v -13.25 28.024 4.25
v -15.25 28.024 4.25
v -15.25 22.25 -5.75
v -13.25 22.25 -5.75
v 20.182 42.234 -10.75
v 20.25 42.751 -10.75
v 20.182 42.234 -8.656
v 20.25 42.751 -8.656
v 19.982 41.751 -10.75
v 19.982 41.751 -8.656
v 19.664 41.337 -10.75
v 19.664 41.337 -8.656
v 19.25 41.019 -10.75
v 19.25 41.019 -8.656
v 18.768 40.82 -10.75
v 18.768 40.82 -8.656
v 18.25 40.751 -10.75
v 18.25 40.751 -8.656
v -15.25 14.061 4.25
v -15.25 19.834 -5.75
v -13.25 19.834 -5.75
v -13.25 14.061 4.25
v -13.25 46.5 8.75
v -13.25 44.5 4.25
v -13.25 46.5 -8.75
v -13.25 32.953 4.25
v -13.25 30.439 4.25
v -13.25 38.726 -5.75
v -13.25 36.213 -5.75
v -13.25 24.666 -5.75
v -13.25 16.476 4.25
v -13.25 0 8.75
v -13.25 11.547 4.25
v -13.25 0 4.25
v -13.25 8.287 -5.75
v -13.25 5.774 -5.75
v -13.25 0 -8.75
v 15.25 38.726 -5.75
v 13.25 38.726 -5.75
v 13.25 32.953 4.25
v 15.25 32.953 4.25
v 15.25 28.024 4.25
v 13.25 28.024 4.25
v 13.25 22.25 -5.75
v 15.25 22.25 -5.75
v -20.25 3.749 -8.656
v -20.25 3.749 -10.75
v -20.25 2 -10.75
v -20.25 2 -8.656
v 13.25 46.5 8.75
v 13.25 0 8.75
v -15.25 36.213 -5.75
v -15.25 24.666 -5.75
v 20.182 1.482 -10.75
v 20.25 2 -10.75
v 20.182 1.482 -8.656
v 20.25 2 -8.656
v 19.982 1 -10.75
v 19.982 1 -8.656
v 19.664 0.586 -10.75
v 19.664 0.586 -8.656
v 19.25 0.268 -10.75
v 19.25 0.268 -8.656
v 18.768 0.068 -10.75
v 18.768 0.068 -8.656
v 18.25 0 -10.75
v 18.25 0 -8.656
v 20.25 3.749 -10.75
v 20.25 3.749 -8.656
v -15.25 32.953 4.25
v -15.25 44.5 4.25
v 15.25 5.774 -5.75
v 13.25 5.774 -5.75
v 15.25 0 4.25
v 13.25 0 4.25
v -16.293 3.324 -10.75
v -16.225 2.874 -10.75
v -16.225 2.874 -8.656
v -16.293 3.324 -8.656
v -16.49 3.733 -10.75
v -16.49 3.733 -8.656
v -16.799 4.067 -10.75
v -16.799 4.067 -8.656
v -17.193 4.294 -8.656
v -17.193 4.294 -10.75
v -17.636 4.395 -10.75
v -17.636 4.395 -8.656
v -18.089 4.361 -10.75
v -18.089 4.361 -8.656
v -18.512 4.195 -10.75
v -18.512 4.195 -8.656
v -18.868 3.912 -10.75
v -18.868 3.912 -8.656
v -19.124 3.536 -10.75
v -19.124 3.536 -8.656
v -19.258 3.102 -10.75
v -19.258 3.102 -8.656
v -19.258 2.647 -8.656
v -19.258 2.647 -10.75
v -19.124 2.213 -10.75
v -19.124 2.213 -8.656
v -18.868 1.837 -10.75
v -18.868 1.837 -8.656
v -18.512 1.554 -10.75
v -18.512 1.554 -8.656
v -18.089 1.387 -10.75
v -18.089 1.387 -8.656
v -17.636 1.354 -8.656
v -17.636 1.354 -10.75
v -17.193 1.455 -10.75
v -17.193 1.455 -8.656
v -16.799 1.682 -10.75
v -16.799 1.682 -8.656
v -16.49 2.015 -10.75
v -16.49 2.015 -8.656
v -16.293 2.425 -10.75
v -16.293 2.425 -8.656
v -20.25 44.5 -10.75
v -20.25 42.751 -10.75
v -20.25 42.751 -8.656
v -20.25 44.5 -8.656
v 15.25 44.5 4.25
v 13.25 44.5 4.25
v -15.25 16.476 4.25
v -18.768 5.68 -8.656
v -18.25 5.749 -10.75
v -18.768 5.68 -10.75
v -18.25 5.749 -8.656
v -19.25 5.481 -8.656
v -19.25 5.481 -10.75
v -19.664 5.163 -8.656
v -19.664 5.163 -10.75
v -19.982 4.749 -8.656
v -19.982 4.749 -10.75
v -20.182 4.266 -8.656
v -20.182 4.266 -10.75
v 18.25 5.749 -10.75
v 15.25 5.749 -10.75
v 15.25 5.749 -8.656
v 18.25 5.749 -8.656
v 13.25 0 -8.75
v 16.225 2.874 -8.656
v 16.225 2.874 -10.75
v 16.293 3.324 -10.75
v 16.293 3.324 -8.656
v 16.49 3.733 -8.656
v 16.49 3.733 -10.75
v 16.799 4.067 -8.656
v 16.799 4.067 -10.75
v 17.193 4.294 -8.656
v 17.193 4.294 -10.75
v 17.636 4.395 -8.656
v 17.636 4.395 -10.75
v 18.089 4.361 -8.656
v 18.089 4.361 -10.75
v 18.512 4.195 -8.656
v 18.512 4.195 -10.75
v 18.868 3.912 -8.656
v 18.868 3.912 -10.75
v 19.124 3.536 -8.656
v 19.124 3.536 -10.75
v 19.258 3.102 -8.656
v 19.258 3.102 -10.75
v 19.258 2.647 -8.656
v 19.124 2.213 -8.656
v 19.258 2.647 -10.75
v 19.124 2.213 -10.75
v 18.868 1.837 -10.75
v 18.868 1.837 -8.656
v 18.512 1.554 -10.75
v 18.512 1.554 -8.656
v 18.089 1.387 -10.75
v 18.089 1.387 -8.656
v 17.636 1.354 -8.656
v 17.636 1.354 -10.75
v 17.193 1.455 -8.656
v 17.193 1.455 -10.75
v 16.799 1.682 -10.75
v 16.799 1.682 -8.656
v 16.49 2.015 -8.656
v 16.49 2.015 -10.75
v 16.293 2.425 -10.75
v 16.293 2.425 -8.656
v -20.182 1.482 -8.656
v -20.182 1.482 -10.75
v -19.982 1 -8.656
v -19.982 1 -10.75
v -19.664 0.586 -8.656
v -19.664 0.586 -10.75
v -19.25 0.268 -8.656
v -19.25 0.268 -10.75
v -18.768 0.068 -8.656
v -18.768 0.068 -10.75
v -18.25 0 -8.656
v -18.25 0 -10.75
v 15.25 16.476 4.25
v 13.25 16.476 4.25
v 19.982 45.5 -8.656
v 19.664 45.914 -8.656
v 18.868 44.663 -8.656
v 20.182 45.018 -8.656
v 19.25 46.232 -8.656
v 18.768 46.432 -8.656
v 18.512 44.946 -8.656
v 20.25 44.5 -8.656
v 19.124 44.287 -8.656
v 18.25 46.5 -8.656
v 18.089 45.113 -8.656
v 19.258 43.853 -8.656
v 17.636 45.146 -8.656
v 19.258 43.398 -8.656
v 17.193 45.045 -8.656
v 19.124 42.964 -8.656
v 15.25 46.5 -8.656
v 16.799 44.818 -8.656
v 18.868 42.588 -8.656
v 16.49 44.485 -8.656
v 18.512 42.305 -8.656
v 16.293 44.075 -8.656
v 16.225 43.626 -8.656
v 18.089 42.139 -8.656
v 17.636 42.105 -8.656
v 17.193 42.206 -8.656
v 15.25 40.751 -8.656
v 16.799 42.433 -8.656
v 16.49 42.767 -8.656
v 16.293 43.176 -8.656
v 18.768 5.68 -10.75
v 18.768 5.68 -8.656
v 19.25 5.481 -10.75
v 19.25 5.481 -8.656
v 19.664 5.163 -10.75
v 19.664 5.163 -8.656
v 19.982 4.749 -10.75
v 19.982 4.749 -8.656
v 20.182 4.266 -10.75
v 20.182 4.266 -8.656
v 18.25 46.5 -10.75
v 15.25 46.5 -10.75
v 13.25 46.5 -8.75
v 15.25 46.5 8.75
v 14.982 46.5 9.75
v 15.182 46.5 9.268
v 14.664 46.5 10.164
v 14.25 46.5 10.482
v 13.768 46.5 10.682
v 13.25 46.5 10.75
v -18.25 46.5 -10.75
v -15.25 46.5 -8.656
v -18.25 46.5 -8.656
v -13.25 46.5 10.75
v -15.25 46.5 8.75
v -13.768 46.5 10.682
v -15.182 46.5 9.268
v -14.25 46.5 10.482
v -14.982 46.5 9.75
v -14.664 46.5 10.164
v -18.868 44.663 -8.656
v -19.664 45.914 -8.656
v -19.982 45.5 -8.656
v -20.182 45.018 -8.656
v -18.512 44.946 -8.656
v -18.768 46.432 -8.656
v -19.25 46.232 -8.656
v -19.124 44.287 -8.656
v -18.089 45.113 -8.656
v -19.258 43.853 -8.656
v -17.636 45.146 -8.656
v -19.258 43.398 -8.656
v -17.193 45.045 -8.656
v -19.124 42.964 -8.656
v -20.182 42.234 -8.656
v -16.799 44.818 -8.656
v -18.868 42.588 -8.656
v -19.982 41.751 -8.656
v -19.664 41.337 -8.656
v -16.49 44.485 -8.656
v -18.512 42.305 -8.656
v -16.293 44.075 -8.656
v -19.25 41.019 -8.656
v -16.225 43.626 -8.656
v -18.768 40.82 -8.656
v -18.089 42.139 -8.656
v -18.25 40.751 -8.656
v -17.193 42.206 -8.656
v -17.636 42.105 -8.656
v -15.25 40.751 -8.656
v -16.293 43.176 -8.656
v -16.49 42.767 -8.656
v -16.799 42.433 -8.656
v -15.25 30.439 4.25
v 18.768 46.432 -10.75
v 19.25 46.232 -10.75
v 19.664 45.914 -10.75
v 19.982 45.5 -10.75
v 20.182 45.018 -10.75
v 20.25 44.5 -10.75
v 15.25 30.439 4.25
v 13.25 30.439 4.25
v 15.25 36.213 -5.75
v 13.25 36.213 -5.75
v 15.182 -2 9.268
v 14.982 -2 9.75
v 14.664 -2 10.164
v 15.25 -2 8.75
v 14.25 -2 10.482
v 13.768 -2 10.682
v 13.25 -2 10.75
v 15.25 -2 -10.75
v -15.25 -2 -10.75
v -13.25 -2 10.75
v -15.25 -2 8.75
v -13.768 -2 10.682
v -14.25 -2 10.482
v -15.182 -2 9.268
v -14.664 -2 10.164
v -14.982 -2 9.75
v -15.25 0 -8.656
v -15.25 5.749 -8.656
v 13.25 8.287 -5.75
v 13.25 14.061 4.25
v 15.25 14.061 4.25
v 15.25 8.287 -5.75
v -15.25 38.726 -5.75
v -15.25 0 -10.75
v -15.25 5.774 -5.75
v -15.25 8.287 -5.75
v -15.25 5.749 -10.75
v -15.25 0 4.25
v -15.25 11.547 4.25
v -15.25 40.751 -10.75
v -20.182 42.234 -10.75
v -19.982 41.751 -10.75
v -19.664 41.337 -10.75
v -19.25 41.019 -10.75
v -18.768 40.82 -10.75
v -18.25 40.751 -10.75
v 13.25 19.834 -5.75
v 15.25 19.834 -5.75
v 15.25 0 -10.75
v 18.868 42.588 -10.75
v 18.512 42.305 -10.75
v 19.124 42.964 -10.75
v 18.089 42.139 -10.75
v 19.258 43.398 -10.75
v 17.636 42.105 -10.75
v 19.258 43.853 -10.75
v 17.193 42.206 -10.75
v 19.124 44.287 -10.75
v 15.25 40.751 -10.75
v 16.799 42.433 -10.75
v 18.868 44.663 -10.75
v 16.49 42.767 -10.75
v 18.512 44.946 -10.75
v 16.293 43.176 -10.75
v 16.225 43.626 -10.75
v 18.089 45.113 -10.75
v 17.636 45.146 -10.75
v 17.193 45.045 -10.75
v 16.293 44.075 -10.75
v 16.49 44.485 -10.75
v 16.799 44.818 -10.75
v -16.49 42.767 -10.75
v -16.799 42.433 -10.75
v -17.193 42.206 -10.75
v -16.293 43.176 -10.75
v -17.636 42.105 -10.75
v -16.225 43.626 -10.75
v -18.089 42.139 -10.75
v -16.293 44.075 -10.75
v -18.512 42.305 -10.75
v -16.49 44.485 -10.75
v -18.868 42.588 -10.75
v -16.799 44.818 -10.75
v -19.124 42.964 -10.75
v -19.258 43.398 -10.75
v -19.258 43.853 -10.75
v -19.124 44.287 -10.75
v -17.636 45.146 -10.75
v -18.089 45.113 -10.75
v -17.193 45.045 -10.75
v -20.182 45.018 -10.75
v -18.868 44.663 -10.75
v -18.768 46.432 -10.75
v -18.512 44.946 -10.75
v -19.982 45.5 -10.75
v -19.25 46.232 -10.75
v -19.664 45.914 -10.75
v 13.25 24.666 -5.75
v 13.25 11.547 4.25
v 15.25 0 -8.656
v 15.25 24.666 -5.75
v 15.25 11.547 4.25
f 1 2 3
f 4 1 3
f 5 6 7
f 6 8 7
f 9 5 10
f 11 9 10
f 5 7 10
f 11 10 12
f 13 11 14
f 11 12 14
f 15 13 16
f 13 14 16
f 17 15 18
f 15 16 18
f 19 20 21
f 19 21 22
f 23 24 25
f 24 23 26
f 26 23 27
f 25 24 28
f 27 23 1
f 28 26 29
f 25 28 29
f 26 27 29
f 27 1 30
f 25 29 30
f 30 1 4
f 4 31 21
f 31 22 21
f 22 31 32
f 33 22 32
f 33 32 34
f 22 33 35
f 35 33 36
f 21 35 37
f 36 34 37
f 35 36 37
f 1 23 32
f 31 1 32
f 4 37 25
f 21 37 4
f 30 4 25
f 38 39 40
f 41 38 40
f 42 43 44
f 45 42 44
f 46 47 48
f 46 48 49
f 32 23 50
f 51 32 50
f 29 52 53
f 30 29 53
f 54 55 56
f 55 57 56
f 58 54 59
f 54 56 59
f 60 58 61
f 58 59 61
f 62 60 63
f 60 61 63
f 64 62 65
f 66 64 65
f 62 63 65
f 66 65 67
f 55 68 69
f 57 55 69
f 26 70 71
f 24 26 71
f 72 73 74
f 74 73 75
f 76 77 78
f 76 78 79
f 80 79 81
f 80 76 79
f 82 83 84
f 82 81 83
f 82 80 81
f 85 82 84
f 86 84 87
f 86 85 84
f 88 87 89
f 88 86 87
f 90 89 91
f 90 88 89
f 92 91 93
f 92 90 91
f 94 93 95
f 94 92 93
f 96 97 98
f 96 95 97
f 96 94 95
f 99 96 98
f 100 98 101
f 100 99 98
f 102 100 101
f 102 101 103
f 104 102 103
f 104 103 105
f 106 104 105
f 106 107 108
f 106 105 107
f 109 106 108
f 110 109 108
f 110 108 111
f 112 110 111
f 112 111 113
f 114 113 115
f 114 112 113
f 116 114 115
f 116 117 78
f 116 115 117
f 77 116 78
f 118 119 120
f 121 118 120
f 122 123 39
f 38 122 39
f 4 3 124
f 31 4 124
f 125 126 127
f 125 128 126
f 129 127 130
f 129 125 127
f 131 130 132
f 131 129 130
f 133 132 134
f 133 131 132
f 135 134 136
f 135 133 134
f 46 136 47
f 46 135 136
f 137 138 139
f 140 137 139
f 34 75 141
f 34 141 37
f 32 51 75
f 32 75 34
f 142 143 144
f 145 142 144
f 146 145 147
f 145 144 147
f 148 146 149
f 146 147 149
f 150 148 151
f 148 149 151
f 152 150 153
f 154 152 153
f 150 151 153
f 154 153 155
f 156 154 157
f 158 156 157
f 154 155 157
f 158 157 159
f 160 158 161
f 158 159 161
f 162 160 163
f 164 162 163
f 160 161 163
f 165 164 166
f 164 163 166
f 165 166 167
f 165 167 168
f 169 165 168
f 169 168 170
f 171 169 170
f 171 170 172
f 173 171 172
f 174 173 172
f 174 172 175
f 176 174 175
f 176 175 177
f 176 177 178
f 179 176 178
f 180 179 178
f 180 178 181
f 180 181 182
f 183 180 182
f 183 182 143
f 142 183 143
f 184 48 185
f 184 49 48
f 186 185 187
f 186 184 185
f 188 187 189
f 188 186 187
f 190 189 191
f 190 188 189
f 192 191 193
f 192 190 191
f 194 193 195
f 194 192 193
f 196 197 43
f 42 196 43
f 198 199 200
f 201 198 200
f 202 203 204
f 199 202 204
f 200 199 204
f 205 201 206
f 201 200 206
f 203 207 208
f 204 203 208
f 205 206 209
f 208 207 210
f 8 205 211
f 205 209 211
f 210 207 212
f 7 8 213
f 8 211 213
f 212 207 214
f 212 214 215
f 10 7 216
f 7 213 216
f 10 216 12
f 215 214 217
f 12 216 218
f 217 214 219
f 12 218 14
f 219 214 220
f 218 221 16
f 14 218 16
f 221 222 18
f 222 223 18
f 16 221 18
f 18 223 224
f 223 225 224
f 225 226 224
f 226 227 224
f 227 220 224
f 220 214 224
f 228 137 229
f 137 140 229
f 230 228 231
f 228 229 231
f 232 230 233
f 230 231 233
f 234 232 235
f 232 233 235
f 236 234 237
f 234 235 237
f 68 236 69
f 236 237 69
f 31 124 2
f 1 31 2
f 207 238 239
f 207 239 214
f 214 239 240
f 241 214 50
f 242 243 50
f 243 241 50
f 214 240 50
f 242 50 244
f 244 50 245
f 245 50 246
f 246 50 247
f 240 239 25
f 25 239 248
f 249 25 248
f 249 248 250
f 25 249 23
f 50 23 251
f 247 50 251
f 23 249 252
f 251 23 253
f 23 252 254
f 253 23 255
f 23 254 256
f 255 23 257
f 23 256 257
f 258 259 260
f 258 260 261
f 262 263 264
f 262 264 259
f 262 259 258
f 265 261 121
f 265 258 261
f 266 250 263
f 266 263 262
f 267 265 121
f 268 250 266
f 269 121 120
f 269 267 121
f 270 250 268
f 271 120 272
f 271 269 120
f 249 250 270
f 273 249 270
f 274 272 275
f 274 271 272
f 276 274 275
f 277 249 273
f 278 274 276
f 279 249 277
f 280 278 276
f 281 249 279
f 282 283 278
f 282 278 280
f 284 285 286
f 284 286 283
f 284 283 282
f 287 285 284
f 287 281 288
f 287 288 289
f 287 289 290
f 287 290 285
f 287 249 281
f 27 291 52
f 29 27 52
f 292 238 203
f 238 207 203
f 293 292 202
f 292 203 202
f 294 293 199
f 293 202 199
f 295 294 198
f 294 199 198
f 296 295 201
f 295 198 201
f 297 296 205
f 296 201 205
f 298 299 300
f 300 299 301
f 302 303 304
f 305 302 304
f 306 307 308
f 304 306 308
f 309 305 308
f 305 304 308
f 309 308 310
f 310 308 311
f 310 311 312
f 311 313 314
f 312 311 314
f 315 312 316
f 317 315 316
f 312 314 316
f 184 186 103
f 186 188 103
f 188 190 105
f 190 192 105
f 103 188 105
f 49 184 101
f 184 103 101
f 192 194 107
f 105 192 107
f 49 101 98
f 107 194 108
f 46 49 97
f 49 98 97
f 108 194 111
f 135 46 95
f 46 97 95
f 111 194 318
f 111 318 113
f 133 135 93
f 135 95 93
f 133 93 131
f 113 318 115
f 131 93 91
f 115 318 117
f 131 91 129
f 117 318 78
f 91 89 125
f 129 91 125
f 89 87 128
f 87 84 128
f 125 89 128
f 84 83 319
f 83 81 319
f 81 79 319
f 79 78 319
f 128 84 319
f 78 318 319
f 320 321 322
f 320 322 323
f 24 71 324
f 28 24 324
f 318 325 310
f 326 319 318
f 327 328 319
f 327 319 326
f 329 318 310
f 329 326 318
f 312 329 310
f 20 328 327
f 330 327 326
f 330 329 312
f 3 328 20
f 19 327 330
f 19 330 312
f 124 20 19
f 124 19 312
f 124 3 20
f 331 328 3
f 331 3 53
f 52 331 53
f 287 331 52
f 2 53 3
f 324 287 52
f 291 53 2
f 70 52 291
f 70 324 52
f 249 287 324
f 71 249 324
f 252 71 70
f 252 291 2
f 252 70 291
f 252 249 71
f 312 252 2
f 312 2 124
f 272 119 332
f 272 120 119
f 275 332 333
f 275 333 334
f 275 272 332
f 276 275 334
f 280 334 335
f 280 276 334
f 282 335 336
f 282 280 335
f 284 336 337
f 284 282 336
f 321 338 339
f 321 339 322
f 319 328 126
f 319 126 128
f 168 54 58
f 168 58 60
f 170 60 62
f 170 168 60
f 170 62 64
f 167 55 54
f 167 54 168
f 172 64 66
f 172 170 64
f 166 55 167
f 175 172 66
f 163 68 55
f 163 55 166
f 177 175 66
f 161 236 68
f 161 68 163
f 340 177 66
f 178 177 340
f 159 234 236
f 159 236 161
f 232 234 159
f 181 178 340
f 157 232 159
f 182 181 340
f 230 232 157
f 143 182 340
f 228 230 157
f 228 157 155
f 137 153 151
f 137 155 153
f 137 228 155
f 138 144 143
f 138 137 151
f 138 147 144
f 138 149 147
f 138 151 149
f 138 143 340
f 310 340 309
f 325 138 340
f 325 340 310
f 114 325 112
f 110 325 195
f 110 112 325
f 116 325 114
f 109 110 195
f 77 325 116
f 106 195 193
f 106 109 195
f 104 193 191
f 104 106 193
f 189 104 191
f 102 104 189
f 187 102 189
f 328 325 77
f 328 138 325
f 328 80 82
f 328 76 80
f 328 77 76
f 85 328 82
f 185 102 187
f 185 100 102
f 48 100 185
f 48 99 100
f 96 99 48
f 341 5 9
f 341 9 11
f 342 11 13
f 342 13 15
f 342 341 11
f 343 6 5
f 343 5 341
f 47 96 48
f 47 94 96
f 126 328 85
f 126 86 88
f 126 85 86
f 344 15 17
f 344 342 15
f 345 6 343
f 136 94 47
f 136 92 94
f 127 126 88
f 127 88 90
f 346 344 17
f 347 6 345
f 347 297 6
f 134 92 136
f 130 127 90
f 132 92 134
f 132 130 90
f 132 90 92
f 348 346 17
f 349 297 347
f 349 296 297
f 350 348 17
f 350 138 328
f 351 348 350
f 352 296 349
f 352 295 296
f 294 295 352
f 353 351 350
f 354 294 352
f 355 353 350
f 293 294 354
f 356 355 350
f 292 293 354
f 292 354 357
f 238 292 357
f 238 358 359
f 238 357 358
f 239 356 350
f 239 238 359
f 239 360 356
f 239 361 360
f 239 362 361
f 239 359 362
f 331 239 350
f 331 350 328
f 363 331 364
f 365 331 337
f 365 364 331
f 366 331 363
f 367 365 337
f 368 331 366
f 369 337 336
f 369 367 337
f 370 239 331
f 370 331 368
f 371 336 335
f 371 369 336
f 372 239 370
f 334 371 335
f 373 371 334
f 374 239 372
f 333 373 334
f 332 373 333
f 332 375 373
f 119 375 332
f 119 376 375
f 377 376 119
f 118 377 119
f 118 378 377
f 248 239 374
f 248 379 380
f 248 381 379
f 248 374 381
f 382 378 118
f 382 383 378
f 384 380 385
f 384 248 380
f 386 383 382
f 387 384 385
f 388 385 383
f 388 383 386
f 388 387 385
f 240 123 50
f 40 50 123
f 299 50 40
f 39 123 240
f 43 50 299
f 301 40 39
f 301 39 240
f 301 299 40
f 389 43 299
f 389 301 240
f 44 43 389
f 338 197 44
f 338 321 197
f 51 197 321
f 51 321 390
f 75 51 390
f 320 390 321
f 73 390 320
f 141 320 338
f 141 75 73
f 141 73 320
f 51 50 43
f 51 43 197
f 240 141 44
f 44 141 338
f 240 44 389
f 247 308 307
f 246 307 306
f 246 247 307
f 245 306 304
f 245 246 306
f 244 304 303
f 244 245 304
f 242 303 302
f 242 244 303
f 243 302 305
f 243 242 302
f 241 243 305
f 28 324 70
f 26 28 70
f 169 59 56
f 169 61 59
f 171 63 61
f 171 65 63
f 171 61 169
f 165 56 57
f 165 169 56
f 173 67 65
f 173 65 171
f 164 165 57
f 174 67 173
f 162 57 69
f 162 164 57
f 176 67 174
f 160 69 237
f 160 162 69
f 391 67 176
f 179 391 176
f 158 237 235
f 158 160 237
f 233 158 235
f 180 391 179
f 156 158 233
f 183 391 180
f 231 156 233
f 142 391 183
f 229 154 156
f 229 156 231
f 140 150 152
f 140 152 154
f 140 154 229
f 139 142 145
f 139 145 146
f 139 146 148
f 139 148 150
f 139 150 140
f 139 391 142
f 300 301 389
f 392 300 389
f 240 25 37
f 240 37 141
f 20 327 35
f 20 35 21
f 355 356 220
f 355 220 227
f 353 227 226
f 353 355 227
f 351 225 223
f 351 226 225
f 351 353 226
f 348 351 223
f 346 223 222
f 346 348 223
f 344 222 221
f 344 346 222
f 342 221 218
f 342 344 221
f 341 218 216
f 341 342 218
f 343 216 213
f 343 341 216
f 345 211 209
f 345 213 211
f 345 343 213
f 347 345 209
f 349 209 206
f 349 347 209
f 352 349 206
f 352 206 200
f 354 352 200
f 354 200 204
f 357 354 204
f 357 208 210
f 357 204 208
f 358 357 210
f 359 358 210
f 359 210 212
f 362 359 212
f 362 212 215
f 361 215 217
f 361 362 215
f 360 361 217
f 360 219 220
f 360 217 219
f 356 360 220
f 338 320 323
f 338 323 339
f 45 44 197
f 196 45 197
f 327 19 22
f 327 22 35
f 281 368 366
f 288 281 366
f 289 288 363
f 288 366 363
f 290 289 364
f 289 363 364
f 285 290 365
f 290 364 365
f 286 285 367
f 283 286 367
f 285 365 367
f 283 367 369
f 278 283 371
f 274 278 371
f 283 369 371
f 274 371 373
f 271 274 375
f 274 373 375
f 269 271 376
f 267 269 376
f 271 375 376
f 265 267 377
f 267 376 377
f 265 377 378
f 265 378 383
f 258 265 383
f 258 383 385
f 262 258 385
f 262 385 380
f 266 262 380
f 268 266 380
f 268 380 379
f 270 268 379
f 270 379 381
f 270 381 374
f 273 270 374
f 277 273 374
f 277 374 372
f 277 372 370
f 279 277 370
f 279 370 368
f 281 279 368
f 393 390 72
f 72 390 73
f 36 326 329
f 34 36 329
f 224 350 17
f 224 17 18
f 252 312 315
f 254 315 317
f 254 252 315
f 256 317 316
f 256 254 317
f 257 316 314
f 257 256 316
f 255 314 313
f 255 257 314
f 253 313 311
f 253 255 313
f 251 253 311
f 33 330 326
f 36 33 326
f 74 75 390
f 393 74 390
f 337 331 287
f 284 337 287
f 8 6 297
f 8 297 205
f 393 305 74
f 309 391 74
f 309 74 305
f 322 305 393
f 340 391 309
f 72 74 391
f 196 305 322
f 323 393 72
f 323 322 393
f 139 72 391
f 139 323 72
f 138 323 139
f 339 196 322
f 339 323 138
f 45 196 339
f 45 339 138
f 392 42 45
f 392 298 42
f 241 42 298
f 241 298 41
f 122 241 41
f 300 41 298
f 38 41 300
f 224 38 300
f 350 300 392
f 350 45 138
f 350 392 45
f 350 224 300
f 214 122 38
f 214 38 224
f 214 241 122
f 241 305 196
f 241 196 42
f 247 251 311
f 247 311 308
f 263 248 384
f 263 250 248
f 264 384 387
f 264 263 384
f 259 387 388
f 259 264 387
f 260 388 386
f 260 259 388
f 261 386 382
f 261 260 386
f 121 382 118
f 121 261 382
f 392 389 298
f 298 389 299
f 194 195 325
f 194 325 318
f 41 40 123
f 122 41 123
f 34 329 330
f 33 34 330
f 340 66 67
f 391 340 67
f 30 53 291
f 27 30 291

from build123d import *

# Parameters (mm, degrees)
SKETCH1_W               = 30.5
SKETCH1_H               = 21.5
SKETCH1_W_2             = 26.5
SKETCH1_H_2             = 17.5
BOSS_EXTRUDE1_DEPTH     = 46.5
FILLET1_R               = 2
SKETCH2_W               = 2.094102849
SKETCH2_H               = 5.748513101
BOSS_EXTRUDE2_DEPTH     = 5
CUT_EXTRUDE1_START      = -3.094102849
SKETCH3_R               = 1.525
CUT_EXTRUDE1_DEPTH      = 23.5
MIRROR4_COPY_1_SKETCH_W = 2.094102849
MIRROR4_COPY_1_SKETCH_H = 5.748513101
MIRROR4_COPY_1_DEPTH    = 5
MIRROR4_START           = -3.094102849
MIRROR4_COPY_2_SKETCH_R = 1.525
MIRROR4_COPY_2_DEPTH    = 23.5
FILLET2_R               = 2
BOSS_EXTRUDE4_DEPTH     = 2
CUT_EXTRUDE2_DEPTH      = 6
CUT_EXTRUDE2_DEPTH_BACK = 36.5


with BuildPart() as part:
    # Sketch1 → Boss-Extrude1 (new body)
    with BuildSketch(Plane(origin=(0, 0, 0), x_dir=(1, 0, 0), z_dir=(0, 1, 0))):
        Rectangle(SKETCH1_W, SKETCH1_H)
        Rectangle(SKETCH1_W_2, SKETCH1_H_2, mode=Mode.SUBTRACT)
    extrude(amount=BOSS_EXTRUDE1_DEPTH)

    # Fillet1
    fillet1_edges = [part.edges().sort_by_distance(p)[0] for p in [
        (-15.25, 23.25, 10.75),
        (15.25, 23.25, 10.75),
    ]]
    fillet(fillet1_edges, radius=FILLET1_R)

    # Sketch2 → Boss-Extrude2 (add)
    with BuildSketch(Plane.ZY.offset(15.25)):
        with Locations((-9.702948576, 2.874256551)):
            Rectangle(SKETCH2_W, SKETCH2_H)
    boss_extrude2 = extrude(amount=BOSS_EXTRUDE2_DEPTH)

    # Sketch3 → Cut-Extrude1 (cut)
    with BuildSketch(Plane.XY.offset(-8.655897151).offset(CUT_EXTRUDE1_START)):
        with Locations((-17.75, 2.874256551)):
            Circle(SKETCH3_R)
    cut_extrude1 = extrude(amount=CUT_EXTRUDE1_DEPTH, mode=Mode.SUBTRACT)

    # Mirror3: Boss-Extrude2, Cut-Extrude1 across plane
    add(boss_extrude2.mirror(Plane.ZX.offset(23.25)))
    add(cut_extrude1.mirror(Plane.ZX.offset(23.25)), mode=Mode.SUBTRACT)

    # Mirror4: Boss-Extrude2, Cut-Extrude1 across plane
    add(boss_extrude2.mirror(Plane(origin=(0, 0, 0), x_dir=(0, 0, 1), z_dir=(1, 0, 0))))
    add(cut_extrude1.mirror(Plane(origin=(0, 0, 0), x_dir=(0, 0, 1), z_dir=(1, 0, 0))), mode=Mode.SUBTRACT)

    # Mirror4 copy 1 sketch → Mirror4 copy 1 (add)
    with BuildSketch(Plane(origin=(15.25, 46.5, 0), x_dir=(0, 0, 1), z_dir=(1, 0, 0))):
        with Locations((-9.702948576, 2.874256551)):
            Rectangle(MIRROR4_COPY_1_SKETCH_W, MIRROR4_COPY_1_SKETCH_H)
    extrude(amount=MIRROR4_COPY_1_DEPTH)

    # Mirror4 copy 2 sketch → Mirror4 copy 2 (cut)
    with BuildSketch(Plane(origin=(0, 46.5, -8.655897151), x_dir=(-1, 0, 0), z_dir=(0, 0, 1)).offset(MIRROR4_START)):
        with Locations((-17.75, 2.874256551)):
            Circle(MIRROR4_COPY_2_SKETCH_R)
    extrude(amount=MIRROR4_COPY_2_DEPTH, mode=Mode.SUBTRACT)

    # Fillet2
    fillet2_edges = [part.edges().sort_by_distance(p)[0] for p in [
        (-20.25, 0, -9.702948576),
        (-20.25, 5.748513101, -9.702948576),
        (-20.25, 40.751486899, -9.702948576),
        (-20.25, 46.5, -9.702948576),
        (20.25, 46.5, -9.702948576),
        (20.25, 40.751486899, -9.702948576),
        (20.25, 5.748513101, -9.702948576),
        (20.25, 0, -9.702948576),
    ]]
    fillet(fillet2_edges, radius=FILLET2_R)

    # Sketch4 → Boss-Extrude4 (add)
    with BuildSketch(Plane.XZ):
        with BuildLine():
            Line((15.25, -10.75), (-15.25, -10.75))
            Line((-15.25, -10.75), (-15.25, 8.75))
            ThreePointArc((-15.25, 8.75), (-14.664213562, 10.164213562), (-13.25, 10.75))
            Line((-13.25, 10.75), (13.25, 10.75))
            ThreePointArc((13.25, 10.75), (14.664213562, 10.164213562), (15.25, 8.75))
            Line((15.25, 8.75), (15.25, -10.75))
        make_face()
    extrude(amount=BOSS_EXTRUDE4_DEPTH)

    # Sketch6 → Cut-Extrude2 (cut, two sides)
    with BuildSketch(Plane.ZY.offset(15.25)) as cut_extrude2_sk:
        Polygon((-5.75, 22.25), (4.25, 16.476497308), (4.25, 28.023502692), align=None)
        Polygon((-5.75, 38.726497308), (4.25, 32.952994616), (4.25, 44.5), align=None)
        Polygon((-5.75, 5.773502692), (4.25, 0), (4.25, 11.547005384), align=None)
        Polygon((4.25, 30.439180122), (-5.75, 36.212682814), (-5.75, 24.66567743), align=None)
        Polygon((-5.75, 19.83432257), (4.25, 14.060819878), (-5.75, 8.287317186), align=None)
    extrude(amount=CUT_EXTRUDE2_DEPTH, mode=Mode.SUBTRACT)
    extrude(cut_extrude2_sk.sketch, amount=-CUT_EXTRUDE2_DEPTH_BACK, mode=Mode.SUBTRACT)


solid = part.part
